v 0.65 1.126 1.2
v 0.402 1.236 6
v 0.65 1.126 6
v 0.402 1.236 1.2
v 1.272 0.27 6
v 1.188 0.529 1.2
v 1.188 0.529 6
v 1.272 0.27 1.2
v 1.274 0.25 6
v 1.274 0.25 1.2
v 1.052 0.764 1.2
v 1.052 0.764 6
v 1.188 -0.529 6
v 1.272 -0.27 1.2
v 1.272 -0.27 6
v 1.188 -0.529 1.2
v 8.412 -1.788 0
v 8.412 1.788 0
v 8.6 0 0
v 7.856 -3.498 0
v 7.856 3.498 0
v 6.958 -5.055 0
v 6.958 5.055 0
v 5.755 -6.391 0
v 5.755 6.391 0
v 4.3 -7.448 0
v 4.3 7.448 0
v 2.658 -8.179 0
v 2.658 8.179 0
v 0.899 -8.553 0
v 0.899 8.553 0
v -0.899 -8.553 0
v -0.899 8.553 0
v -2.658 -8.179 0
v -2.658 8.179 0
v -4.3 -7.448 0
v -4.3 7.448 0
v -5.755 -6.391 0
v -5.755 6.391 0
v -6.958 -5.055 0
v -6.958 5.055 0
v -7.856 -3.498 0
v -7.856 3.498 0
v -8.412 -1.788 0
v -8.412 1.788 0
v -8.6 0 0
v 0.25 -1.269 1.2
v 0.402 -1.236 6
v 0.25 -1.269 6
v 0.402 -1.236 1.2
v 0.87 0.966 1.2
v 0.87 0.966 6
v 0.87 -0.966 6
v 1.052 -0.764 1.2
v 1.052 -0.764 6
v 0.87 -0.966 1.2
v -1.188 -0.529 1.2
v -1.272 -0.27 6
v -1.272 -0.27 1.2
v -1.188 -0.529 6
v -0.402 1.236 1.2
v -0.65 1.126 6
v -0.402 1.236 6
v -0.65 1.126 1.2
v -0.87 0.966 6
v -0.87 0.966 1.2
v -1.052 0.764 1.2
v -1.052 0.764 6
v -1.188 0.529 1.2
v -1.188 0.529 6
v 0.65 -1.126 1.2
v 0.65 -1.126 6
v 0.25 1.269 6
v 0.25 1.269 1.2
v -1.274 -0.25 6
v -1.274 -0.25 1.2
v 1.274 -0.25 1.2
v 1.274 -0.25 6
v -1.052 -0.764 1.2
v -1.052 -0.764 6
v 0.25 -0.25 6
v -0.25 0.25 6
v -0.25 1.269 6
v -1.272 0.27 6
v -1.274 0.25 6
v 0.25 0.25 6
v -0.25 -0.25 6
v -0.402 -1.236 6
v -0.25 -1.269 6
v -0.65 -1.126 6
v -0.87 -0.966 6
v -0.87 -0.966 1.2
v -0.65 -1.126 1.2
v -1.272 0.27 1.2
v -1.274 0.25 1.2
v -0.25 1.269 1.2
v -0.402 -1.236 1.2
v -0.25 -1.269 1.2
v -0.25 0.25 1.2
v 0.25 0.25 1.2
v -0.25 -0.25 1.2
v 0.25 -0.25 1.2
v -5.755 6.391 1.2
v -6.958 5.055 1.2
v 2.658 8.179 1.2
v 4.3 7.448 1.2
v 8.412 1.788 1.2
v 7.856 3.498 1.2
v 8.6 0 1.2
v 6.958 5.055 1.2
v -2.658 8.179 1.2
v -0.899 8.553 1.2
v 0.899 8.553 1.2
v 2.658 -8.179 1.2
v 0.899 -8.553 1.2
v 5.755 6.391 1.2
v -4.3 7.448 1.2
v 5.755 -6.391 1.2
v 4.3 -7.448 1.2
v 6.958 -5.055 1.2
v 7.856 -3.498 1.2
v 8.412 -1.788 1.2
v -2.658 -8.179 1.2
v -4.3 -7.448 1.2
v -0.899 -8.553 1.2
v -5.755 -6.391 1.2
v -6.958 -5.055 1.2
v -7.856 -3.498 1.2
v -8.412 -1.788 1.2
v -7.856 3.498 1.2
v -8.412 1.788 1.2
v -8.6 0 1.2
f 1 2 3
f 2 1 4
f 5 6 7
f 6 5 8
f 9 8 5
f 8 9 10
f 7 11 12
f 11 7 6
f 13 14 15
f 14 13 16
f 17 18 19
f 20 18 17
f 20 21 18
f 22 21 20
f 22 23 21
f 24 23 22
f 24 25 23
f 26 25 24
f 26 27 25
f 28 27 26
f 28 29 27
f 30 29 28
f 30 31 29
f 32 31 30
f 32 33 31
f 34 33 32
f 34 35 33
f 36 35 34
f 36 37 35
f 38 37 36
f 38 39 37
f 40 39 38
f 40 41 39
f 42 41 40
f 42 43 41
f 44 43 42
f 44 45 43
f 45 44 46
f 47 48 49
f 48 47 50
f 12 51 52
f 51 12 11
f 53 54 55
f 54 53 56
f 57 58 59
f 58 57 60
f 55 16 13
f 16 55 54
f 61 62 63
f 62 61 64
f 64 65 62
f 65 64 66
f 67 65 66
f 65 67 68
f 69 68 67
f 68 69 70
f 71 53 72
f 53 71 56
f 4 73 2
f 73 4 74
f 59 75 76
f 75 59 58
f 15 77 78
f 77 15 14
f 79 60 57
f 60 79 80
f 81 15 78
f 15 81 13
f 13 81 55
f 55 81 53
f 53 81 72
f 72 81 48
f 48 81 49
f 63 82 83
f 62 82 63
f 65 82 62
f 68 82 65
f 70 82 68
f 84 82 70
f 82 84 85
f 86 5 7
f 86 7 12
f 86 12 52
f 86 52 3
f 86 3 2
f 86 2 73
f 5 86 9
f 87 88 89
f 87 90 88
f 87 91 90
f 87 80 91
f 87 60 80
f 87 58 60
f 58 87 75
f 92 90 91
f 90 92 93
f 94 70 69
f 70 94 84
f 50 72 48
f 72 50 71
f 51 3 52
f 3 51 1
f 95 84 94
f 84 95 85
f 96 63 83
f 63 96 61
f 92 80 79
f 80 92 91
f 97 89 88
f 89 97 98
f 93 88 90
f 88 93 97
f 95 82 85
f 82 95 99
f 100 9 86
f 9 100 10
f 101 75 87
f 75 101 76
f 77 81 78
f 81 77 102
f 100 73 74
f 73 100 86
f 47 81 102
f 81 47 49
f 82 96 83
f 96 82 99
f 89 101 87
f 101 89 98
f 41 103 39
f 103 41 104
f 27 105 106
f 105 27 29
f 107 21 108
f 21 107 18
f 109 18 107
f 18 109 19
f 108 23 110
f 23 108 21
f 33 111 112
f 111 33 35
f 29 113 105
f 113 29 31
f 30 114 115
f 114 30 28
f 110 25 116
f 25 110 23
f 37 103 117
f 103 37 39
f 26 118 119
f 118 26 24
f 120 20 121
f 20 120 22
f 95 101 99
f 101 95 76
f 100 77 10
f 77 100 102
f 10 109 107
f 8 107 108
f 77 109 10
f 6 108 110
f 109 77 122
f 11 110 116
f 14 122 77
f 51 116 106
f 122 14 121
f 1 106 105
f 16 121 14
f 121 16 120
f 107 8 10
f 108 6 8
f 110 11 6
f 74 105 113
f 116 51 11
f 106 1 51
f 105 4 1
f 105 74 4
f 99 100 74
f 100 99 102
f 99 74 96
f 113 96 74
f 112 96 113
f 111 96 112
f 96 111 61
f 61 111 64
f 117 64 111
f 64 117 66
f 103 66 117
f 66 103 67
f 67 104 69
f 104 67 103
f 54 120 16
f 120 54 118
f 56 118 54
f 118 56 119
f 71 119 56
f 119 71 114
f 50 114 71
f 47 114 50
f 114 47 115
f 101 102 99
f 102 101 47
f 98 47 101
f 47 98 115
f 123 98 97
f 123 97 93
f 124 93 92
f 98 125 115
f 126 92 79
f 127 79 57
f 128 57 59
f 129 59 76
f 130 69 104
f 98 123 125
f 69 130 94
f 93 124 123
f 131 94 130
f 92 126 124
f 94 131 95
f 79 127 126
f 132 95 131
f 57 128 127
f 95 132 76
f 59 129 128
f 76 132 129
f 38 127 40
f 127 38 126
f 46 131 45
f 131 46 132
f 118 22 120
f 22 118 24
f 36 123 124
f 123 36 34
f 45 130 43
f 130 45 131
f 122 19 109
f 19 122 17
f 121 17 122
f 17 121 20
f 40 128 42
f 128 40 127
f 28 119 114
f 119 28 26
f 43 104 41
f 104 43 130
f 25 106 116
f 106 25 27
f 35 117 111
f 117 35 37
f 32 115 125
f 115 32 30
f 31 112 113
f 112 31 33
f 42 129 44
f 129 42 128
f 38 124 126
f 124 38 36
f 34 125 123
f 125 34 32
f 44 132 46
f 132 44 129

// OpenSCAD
//////////////////////////////////////////////////////////////////////////////////////////////
module pin (
)
{
    
gear = 1;
    collaHeightOffset = 0;
    collaDiamater = 10;
    gearHeight = 3;
    keyWidth = 2;
    keyHeight = 2;
    collaWidth = 1.3;
    gearDiamater = 35;

    collaSpacing = 2.0;
    
    collaHeightOffset= 18- ((gear -1) * (7.35 ));
    
    bushingDi = 12;
    
    collaDiamater = 2.6 + ((gear -1)  * 2);
    discDiam = 2.6 + ((4 -1)  * 2);
    
    collaHeight = 15  + collaHeightOffset;
    bushingHeight = 2;
    tabHeight  = collaHeightOffset - gearHeight;
    innerCollaDiamater = collaDiamater - collaWidth;
    tabHeight =  (collaHeight / 30) + gearHeight * gear ;
innerCollaHeight = collaHeight * 3;
    
    union(){
        cylinder(1.2, discDiam, discDiam, false);
    
        difference(){
        cylinder(6, innerCollaDiamater, innerCollaDiamater, false);
            cube([11,0.5,13], true);
            cube([0.5,11,13], true);
        }
    }
    
}
$fs = 0.01;

pin();
